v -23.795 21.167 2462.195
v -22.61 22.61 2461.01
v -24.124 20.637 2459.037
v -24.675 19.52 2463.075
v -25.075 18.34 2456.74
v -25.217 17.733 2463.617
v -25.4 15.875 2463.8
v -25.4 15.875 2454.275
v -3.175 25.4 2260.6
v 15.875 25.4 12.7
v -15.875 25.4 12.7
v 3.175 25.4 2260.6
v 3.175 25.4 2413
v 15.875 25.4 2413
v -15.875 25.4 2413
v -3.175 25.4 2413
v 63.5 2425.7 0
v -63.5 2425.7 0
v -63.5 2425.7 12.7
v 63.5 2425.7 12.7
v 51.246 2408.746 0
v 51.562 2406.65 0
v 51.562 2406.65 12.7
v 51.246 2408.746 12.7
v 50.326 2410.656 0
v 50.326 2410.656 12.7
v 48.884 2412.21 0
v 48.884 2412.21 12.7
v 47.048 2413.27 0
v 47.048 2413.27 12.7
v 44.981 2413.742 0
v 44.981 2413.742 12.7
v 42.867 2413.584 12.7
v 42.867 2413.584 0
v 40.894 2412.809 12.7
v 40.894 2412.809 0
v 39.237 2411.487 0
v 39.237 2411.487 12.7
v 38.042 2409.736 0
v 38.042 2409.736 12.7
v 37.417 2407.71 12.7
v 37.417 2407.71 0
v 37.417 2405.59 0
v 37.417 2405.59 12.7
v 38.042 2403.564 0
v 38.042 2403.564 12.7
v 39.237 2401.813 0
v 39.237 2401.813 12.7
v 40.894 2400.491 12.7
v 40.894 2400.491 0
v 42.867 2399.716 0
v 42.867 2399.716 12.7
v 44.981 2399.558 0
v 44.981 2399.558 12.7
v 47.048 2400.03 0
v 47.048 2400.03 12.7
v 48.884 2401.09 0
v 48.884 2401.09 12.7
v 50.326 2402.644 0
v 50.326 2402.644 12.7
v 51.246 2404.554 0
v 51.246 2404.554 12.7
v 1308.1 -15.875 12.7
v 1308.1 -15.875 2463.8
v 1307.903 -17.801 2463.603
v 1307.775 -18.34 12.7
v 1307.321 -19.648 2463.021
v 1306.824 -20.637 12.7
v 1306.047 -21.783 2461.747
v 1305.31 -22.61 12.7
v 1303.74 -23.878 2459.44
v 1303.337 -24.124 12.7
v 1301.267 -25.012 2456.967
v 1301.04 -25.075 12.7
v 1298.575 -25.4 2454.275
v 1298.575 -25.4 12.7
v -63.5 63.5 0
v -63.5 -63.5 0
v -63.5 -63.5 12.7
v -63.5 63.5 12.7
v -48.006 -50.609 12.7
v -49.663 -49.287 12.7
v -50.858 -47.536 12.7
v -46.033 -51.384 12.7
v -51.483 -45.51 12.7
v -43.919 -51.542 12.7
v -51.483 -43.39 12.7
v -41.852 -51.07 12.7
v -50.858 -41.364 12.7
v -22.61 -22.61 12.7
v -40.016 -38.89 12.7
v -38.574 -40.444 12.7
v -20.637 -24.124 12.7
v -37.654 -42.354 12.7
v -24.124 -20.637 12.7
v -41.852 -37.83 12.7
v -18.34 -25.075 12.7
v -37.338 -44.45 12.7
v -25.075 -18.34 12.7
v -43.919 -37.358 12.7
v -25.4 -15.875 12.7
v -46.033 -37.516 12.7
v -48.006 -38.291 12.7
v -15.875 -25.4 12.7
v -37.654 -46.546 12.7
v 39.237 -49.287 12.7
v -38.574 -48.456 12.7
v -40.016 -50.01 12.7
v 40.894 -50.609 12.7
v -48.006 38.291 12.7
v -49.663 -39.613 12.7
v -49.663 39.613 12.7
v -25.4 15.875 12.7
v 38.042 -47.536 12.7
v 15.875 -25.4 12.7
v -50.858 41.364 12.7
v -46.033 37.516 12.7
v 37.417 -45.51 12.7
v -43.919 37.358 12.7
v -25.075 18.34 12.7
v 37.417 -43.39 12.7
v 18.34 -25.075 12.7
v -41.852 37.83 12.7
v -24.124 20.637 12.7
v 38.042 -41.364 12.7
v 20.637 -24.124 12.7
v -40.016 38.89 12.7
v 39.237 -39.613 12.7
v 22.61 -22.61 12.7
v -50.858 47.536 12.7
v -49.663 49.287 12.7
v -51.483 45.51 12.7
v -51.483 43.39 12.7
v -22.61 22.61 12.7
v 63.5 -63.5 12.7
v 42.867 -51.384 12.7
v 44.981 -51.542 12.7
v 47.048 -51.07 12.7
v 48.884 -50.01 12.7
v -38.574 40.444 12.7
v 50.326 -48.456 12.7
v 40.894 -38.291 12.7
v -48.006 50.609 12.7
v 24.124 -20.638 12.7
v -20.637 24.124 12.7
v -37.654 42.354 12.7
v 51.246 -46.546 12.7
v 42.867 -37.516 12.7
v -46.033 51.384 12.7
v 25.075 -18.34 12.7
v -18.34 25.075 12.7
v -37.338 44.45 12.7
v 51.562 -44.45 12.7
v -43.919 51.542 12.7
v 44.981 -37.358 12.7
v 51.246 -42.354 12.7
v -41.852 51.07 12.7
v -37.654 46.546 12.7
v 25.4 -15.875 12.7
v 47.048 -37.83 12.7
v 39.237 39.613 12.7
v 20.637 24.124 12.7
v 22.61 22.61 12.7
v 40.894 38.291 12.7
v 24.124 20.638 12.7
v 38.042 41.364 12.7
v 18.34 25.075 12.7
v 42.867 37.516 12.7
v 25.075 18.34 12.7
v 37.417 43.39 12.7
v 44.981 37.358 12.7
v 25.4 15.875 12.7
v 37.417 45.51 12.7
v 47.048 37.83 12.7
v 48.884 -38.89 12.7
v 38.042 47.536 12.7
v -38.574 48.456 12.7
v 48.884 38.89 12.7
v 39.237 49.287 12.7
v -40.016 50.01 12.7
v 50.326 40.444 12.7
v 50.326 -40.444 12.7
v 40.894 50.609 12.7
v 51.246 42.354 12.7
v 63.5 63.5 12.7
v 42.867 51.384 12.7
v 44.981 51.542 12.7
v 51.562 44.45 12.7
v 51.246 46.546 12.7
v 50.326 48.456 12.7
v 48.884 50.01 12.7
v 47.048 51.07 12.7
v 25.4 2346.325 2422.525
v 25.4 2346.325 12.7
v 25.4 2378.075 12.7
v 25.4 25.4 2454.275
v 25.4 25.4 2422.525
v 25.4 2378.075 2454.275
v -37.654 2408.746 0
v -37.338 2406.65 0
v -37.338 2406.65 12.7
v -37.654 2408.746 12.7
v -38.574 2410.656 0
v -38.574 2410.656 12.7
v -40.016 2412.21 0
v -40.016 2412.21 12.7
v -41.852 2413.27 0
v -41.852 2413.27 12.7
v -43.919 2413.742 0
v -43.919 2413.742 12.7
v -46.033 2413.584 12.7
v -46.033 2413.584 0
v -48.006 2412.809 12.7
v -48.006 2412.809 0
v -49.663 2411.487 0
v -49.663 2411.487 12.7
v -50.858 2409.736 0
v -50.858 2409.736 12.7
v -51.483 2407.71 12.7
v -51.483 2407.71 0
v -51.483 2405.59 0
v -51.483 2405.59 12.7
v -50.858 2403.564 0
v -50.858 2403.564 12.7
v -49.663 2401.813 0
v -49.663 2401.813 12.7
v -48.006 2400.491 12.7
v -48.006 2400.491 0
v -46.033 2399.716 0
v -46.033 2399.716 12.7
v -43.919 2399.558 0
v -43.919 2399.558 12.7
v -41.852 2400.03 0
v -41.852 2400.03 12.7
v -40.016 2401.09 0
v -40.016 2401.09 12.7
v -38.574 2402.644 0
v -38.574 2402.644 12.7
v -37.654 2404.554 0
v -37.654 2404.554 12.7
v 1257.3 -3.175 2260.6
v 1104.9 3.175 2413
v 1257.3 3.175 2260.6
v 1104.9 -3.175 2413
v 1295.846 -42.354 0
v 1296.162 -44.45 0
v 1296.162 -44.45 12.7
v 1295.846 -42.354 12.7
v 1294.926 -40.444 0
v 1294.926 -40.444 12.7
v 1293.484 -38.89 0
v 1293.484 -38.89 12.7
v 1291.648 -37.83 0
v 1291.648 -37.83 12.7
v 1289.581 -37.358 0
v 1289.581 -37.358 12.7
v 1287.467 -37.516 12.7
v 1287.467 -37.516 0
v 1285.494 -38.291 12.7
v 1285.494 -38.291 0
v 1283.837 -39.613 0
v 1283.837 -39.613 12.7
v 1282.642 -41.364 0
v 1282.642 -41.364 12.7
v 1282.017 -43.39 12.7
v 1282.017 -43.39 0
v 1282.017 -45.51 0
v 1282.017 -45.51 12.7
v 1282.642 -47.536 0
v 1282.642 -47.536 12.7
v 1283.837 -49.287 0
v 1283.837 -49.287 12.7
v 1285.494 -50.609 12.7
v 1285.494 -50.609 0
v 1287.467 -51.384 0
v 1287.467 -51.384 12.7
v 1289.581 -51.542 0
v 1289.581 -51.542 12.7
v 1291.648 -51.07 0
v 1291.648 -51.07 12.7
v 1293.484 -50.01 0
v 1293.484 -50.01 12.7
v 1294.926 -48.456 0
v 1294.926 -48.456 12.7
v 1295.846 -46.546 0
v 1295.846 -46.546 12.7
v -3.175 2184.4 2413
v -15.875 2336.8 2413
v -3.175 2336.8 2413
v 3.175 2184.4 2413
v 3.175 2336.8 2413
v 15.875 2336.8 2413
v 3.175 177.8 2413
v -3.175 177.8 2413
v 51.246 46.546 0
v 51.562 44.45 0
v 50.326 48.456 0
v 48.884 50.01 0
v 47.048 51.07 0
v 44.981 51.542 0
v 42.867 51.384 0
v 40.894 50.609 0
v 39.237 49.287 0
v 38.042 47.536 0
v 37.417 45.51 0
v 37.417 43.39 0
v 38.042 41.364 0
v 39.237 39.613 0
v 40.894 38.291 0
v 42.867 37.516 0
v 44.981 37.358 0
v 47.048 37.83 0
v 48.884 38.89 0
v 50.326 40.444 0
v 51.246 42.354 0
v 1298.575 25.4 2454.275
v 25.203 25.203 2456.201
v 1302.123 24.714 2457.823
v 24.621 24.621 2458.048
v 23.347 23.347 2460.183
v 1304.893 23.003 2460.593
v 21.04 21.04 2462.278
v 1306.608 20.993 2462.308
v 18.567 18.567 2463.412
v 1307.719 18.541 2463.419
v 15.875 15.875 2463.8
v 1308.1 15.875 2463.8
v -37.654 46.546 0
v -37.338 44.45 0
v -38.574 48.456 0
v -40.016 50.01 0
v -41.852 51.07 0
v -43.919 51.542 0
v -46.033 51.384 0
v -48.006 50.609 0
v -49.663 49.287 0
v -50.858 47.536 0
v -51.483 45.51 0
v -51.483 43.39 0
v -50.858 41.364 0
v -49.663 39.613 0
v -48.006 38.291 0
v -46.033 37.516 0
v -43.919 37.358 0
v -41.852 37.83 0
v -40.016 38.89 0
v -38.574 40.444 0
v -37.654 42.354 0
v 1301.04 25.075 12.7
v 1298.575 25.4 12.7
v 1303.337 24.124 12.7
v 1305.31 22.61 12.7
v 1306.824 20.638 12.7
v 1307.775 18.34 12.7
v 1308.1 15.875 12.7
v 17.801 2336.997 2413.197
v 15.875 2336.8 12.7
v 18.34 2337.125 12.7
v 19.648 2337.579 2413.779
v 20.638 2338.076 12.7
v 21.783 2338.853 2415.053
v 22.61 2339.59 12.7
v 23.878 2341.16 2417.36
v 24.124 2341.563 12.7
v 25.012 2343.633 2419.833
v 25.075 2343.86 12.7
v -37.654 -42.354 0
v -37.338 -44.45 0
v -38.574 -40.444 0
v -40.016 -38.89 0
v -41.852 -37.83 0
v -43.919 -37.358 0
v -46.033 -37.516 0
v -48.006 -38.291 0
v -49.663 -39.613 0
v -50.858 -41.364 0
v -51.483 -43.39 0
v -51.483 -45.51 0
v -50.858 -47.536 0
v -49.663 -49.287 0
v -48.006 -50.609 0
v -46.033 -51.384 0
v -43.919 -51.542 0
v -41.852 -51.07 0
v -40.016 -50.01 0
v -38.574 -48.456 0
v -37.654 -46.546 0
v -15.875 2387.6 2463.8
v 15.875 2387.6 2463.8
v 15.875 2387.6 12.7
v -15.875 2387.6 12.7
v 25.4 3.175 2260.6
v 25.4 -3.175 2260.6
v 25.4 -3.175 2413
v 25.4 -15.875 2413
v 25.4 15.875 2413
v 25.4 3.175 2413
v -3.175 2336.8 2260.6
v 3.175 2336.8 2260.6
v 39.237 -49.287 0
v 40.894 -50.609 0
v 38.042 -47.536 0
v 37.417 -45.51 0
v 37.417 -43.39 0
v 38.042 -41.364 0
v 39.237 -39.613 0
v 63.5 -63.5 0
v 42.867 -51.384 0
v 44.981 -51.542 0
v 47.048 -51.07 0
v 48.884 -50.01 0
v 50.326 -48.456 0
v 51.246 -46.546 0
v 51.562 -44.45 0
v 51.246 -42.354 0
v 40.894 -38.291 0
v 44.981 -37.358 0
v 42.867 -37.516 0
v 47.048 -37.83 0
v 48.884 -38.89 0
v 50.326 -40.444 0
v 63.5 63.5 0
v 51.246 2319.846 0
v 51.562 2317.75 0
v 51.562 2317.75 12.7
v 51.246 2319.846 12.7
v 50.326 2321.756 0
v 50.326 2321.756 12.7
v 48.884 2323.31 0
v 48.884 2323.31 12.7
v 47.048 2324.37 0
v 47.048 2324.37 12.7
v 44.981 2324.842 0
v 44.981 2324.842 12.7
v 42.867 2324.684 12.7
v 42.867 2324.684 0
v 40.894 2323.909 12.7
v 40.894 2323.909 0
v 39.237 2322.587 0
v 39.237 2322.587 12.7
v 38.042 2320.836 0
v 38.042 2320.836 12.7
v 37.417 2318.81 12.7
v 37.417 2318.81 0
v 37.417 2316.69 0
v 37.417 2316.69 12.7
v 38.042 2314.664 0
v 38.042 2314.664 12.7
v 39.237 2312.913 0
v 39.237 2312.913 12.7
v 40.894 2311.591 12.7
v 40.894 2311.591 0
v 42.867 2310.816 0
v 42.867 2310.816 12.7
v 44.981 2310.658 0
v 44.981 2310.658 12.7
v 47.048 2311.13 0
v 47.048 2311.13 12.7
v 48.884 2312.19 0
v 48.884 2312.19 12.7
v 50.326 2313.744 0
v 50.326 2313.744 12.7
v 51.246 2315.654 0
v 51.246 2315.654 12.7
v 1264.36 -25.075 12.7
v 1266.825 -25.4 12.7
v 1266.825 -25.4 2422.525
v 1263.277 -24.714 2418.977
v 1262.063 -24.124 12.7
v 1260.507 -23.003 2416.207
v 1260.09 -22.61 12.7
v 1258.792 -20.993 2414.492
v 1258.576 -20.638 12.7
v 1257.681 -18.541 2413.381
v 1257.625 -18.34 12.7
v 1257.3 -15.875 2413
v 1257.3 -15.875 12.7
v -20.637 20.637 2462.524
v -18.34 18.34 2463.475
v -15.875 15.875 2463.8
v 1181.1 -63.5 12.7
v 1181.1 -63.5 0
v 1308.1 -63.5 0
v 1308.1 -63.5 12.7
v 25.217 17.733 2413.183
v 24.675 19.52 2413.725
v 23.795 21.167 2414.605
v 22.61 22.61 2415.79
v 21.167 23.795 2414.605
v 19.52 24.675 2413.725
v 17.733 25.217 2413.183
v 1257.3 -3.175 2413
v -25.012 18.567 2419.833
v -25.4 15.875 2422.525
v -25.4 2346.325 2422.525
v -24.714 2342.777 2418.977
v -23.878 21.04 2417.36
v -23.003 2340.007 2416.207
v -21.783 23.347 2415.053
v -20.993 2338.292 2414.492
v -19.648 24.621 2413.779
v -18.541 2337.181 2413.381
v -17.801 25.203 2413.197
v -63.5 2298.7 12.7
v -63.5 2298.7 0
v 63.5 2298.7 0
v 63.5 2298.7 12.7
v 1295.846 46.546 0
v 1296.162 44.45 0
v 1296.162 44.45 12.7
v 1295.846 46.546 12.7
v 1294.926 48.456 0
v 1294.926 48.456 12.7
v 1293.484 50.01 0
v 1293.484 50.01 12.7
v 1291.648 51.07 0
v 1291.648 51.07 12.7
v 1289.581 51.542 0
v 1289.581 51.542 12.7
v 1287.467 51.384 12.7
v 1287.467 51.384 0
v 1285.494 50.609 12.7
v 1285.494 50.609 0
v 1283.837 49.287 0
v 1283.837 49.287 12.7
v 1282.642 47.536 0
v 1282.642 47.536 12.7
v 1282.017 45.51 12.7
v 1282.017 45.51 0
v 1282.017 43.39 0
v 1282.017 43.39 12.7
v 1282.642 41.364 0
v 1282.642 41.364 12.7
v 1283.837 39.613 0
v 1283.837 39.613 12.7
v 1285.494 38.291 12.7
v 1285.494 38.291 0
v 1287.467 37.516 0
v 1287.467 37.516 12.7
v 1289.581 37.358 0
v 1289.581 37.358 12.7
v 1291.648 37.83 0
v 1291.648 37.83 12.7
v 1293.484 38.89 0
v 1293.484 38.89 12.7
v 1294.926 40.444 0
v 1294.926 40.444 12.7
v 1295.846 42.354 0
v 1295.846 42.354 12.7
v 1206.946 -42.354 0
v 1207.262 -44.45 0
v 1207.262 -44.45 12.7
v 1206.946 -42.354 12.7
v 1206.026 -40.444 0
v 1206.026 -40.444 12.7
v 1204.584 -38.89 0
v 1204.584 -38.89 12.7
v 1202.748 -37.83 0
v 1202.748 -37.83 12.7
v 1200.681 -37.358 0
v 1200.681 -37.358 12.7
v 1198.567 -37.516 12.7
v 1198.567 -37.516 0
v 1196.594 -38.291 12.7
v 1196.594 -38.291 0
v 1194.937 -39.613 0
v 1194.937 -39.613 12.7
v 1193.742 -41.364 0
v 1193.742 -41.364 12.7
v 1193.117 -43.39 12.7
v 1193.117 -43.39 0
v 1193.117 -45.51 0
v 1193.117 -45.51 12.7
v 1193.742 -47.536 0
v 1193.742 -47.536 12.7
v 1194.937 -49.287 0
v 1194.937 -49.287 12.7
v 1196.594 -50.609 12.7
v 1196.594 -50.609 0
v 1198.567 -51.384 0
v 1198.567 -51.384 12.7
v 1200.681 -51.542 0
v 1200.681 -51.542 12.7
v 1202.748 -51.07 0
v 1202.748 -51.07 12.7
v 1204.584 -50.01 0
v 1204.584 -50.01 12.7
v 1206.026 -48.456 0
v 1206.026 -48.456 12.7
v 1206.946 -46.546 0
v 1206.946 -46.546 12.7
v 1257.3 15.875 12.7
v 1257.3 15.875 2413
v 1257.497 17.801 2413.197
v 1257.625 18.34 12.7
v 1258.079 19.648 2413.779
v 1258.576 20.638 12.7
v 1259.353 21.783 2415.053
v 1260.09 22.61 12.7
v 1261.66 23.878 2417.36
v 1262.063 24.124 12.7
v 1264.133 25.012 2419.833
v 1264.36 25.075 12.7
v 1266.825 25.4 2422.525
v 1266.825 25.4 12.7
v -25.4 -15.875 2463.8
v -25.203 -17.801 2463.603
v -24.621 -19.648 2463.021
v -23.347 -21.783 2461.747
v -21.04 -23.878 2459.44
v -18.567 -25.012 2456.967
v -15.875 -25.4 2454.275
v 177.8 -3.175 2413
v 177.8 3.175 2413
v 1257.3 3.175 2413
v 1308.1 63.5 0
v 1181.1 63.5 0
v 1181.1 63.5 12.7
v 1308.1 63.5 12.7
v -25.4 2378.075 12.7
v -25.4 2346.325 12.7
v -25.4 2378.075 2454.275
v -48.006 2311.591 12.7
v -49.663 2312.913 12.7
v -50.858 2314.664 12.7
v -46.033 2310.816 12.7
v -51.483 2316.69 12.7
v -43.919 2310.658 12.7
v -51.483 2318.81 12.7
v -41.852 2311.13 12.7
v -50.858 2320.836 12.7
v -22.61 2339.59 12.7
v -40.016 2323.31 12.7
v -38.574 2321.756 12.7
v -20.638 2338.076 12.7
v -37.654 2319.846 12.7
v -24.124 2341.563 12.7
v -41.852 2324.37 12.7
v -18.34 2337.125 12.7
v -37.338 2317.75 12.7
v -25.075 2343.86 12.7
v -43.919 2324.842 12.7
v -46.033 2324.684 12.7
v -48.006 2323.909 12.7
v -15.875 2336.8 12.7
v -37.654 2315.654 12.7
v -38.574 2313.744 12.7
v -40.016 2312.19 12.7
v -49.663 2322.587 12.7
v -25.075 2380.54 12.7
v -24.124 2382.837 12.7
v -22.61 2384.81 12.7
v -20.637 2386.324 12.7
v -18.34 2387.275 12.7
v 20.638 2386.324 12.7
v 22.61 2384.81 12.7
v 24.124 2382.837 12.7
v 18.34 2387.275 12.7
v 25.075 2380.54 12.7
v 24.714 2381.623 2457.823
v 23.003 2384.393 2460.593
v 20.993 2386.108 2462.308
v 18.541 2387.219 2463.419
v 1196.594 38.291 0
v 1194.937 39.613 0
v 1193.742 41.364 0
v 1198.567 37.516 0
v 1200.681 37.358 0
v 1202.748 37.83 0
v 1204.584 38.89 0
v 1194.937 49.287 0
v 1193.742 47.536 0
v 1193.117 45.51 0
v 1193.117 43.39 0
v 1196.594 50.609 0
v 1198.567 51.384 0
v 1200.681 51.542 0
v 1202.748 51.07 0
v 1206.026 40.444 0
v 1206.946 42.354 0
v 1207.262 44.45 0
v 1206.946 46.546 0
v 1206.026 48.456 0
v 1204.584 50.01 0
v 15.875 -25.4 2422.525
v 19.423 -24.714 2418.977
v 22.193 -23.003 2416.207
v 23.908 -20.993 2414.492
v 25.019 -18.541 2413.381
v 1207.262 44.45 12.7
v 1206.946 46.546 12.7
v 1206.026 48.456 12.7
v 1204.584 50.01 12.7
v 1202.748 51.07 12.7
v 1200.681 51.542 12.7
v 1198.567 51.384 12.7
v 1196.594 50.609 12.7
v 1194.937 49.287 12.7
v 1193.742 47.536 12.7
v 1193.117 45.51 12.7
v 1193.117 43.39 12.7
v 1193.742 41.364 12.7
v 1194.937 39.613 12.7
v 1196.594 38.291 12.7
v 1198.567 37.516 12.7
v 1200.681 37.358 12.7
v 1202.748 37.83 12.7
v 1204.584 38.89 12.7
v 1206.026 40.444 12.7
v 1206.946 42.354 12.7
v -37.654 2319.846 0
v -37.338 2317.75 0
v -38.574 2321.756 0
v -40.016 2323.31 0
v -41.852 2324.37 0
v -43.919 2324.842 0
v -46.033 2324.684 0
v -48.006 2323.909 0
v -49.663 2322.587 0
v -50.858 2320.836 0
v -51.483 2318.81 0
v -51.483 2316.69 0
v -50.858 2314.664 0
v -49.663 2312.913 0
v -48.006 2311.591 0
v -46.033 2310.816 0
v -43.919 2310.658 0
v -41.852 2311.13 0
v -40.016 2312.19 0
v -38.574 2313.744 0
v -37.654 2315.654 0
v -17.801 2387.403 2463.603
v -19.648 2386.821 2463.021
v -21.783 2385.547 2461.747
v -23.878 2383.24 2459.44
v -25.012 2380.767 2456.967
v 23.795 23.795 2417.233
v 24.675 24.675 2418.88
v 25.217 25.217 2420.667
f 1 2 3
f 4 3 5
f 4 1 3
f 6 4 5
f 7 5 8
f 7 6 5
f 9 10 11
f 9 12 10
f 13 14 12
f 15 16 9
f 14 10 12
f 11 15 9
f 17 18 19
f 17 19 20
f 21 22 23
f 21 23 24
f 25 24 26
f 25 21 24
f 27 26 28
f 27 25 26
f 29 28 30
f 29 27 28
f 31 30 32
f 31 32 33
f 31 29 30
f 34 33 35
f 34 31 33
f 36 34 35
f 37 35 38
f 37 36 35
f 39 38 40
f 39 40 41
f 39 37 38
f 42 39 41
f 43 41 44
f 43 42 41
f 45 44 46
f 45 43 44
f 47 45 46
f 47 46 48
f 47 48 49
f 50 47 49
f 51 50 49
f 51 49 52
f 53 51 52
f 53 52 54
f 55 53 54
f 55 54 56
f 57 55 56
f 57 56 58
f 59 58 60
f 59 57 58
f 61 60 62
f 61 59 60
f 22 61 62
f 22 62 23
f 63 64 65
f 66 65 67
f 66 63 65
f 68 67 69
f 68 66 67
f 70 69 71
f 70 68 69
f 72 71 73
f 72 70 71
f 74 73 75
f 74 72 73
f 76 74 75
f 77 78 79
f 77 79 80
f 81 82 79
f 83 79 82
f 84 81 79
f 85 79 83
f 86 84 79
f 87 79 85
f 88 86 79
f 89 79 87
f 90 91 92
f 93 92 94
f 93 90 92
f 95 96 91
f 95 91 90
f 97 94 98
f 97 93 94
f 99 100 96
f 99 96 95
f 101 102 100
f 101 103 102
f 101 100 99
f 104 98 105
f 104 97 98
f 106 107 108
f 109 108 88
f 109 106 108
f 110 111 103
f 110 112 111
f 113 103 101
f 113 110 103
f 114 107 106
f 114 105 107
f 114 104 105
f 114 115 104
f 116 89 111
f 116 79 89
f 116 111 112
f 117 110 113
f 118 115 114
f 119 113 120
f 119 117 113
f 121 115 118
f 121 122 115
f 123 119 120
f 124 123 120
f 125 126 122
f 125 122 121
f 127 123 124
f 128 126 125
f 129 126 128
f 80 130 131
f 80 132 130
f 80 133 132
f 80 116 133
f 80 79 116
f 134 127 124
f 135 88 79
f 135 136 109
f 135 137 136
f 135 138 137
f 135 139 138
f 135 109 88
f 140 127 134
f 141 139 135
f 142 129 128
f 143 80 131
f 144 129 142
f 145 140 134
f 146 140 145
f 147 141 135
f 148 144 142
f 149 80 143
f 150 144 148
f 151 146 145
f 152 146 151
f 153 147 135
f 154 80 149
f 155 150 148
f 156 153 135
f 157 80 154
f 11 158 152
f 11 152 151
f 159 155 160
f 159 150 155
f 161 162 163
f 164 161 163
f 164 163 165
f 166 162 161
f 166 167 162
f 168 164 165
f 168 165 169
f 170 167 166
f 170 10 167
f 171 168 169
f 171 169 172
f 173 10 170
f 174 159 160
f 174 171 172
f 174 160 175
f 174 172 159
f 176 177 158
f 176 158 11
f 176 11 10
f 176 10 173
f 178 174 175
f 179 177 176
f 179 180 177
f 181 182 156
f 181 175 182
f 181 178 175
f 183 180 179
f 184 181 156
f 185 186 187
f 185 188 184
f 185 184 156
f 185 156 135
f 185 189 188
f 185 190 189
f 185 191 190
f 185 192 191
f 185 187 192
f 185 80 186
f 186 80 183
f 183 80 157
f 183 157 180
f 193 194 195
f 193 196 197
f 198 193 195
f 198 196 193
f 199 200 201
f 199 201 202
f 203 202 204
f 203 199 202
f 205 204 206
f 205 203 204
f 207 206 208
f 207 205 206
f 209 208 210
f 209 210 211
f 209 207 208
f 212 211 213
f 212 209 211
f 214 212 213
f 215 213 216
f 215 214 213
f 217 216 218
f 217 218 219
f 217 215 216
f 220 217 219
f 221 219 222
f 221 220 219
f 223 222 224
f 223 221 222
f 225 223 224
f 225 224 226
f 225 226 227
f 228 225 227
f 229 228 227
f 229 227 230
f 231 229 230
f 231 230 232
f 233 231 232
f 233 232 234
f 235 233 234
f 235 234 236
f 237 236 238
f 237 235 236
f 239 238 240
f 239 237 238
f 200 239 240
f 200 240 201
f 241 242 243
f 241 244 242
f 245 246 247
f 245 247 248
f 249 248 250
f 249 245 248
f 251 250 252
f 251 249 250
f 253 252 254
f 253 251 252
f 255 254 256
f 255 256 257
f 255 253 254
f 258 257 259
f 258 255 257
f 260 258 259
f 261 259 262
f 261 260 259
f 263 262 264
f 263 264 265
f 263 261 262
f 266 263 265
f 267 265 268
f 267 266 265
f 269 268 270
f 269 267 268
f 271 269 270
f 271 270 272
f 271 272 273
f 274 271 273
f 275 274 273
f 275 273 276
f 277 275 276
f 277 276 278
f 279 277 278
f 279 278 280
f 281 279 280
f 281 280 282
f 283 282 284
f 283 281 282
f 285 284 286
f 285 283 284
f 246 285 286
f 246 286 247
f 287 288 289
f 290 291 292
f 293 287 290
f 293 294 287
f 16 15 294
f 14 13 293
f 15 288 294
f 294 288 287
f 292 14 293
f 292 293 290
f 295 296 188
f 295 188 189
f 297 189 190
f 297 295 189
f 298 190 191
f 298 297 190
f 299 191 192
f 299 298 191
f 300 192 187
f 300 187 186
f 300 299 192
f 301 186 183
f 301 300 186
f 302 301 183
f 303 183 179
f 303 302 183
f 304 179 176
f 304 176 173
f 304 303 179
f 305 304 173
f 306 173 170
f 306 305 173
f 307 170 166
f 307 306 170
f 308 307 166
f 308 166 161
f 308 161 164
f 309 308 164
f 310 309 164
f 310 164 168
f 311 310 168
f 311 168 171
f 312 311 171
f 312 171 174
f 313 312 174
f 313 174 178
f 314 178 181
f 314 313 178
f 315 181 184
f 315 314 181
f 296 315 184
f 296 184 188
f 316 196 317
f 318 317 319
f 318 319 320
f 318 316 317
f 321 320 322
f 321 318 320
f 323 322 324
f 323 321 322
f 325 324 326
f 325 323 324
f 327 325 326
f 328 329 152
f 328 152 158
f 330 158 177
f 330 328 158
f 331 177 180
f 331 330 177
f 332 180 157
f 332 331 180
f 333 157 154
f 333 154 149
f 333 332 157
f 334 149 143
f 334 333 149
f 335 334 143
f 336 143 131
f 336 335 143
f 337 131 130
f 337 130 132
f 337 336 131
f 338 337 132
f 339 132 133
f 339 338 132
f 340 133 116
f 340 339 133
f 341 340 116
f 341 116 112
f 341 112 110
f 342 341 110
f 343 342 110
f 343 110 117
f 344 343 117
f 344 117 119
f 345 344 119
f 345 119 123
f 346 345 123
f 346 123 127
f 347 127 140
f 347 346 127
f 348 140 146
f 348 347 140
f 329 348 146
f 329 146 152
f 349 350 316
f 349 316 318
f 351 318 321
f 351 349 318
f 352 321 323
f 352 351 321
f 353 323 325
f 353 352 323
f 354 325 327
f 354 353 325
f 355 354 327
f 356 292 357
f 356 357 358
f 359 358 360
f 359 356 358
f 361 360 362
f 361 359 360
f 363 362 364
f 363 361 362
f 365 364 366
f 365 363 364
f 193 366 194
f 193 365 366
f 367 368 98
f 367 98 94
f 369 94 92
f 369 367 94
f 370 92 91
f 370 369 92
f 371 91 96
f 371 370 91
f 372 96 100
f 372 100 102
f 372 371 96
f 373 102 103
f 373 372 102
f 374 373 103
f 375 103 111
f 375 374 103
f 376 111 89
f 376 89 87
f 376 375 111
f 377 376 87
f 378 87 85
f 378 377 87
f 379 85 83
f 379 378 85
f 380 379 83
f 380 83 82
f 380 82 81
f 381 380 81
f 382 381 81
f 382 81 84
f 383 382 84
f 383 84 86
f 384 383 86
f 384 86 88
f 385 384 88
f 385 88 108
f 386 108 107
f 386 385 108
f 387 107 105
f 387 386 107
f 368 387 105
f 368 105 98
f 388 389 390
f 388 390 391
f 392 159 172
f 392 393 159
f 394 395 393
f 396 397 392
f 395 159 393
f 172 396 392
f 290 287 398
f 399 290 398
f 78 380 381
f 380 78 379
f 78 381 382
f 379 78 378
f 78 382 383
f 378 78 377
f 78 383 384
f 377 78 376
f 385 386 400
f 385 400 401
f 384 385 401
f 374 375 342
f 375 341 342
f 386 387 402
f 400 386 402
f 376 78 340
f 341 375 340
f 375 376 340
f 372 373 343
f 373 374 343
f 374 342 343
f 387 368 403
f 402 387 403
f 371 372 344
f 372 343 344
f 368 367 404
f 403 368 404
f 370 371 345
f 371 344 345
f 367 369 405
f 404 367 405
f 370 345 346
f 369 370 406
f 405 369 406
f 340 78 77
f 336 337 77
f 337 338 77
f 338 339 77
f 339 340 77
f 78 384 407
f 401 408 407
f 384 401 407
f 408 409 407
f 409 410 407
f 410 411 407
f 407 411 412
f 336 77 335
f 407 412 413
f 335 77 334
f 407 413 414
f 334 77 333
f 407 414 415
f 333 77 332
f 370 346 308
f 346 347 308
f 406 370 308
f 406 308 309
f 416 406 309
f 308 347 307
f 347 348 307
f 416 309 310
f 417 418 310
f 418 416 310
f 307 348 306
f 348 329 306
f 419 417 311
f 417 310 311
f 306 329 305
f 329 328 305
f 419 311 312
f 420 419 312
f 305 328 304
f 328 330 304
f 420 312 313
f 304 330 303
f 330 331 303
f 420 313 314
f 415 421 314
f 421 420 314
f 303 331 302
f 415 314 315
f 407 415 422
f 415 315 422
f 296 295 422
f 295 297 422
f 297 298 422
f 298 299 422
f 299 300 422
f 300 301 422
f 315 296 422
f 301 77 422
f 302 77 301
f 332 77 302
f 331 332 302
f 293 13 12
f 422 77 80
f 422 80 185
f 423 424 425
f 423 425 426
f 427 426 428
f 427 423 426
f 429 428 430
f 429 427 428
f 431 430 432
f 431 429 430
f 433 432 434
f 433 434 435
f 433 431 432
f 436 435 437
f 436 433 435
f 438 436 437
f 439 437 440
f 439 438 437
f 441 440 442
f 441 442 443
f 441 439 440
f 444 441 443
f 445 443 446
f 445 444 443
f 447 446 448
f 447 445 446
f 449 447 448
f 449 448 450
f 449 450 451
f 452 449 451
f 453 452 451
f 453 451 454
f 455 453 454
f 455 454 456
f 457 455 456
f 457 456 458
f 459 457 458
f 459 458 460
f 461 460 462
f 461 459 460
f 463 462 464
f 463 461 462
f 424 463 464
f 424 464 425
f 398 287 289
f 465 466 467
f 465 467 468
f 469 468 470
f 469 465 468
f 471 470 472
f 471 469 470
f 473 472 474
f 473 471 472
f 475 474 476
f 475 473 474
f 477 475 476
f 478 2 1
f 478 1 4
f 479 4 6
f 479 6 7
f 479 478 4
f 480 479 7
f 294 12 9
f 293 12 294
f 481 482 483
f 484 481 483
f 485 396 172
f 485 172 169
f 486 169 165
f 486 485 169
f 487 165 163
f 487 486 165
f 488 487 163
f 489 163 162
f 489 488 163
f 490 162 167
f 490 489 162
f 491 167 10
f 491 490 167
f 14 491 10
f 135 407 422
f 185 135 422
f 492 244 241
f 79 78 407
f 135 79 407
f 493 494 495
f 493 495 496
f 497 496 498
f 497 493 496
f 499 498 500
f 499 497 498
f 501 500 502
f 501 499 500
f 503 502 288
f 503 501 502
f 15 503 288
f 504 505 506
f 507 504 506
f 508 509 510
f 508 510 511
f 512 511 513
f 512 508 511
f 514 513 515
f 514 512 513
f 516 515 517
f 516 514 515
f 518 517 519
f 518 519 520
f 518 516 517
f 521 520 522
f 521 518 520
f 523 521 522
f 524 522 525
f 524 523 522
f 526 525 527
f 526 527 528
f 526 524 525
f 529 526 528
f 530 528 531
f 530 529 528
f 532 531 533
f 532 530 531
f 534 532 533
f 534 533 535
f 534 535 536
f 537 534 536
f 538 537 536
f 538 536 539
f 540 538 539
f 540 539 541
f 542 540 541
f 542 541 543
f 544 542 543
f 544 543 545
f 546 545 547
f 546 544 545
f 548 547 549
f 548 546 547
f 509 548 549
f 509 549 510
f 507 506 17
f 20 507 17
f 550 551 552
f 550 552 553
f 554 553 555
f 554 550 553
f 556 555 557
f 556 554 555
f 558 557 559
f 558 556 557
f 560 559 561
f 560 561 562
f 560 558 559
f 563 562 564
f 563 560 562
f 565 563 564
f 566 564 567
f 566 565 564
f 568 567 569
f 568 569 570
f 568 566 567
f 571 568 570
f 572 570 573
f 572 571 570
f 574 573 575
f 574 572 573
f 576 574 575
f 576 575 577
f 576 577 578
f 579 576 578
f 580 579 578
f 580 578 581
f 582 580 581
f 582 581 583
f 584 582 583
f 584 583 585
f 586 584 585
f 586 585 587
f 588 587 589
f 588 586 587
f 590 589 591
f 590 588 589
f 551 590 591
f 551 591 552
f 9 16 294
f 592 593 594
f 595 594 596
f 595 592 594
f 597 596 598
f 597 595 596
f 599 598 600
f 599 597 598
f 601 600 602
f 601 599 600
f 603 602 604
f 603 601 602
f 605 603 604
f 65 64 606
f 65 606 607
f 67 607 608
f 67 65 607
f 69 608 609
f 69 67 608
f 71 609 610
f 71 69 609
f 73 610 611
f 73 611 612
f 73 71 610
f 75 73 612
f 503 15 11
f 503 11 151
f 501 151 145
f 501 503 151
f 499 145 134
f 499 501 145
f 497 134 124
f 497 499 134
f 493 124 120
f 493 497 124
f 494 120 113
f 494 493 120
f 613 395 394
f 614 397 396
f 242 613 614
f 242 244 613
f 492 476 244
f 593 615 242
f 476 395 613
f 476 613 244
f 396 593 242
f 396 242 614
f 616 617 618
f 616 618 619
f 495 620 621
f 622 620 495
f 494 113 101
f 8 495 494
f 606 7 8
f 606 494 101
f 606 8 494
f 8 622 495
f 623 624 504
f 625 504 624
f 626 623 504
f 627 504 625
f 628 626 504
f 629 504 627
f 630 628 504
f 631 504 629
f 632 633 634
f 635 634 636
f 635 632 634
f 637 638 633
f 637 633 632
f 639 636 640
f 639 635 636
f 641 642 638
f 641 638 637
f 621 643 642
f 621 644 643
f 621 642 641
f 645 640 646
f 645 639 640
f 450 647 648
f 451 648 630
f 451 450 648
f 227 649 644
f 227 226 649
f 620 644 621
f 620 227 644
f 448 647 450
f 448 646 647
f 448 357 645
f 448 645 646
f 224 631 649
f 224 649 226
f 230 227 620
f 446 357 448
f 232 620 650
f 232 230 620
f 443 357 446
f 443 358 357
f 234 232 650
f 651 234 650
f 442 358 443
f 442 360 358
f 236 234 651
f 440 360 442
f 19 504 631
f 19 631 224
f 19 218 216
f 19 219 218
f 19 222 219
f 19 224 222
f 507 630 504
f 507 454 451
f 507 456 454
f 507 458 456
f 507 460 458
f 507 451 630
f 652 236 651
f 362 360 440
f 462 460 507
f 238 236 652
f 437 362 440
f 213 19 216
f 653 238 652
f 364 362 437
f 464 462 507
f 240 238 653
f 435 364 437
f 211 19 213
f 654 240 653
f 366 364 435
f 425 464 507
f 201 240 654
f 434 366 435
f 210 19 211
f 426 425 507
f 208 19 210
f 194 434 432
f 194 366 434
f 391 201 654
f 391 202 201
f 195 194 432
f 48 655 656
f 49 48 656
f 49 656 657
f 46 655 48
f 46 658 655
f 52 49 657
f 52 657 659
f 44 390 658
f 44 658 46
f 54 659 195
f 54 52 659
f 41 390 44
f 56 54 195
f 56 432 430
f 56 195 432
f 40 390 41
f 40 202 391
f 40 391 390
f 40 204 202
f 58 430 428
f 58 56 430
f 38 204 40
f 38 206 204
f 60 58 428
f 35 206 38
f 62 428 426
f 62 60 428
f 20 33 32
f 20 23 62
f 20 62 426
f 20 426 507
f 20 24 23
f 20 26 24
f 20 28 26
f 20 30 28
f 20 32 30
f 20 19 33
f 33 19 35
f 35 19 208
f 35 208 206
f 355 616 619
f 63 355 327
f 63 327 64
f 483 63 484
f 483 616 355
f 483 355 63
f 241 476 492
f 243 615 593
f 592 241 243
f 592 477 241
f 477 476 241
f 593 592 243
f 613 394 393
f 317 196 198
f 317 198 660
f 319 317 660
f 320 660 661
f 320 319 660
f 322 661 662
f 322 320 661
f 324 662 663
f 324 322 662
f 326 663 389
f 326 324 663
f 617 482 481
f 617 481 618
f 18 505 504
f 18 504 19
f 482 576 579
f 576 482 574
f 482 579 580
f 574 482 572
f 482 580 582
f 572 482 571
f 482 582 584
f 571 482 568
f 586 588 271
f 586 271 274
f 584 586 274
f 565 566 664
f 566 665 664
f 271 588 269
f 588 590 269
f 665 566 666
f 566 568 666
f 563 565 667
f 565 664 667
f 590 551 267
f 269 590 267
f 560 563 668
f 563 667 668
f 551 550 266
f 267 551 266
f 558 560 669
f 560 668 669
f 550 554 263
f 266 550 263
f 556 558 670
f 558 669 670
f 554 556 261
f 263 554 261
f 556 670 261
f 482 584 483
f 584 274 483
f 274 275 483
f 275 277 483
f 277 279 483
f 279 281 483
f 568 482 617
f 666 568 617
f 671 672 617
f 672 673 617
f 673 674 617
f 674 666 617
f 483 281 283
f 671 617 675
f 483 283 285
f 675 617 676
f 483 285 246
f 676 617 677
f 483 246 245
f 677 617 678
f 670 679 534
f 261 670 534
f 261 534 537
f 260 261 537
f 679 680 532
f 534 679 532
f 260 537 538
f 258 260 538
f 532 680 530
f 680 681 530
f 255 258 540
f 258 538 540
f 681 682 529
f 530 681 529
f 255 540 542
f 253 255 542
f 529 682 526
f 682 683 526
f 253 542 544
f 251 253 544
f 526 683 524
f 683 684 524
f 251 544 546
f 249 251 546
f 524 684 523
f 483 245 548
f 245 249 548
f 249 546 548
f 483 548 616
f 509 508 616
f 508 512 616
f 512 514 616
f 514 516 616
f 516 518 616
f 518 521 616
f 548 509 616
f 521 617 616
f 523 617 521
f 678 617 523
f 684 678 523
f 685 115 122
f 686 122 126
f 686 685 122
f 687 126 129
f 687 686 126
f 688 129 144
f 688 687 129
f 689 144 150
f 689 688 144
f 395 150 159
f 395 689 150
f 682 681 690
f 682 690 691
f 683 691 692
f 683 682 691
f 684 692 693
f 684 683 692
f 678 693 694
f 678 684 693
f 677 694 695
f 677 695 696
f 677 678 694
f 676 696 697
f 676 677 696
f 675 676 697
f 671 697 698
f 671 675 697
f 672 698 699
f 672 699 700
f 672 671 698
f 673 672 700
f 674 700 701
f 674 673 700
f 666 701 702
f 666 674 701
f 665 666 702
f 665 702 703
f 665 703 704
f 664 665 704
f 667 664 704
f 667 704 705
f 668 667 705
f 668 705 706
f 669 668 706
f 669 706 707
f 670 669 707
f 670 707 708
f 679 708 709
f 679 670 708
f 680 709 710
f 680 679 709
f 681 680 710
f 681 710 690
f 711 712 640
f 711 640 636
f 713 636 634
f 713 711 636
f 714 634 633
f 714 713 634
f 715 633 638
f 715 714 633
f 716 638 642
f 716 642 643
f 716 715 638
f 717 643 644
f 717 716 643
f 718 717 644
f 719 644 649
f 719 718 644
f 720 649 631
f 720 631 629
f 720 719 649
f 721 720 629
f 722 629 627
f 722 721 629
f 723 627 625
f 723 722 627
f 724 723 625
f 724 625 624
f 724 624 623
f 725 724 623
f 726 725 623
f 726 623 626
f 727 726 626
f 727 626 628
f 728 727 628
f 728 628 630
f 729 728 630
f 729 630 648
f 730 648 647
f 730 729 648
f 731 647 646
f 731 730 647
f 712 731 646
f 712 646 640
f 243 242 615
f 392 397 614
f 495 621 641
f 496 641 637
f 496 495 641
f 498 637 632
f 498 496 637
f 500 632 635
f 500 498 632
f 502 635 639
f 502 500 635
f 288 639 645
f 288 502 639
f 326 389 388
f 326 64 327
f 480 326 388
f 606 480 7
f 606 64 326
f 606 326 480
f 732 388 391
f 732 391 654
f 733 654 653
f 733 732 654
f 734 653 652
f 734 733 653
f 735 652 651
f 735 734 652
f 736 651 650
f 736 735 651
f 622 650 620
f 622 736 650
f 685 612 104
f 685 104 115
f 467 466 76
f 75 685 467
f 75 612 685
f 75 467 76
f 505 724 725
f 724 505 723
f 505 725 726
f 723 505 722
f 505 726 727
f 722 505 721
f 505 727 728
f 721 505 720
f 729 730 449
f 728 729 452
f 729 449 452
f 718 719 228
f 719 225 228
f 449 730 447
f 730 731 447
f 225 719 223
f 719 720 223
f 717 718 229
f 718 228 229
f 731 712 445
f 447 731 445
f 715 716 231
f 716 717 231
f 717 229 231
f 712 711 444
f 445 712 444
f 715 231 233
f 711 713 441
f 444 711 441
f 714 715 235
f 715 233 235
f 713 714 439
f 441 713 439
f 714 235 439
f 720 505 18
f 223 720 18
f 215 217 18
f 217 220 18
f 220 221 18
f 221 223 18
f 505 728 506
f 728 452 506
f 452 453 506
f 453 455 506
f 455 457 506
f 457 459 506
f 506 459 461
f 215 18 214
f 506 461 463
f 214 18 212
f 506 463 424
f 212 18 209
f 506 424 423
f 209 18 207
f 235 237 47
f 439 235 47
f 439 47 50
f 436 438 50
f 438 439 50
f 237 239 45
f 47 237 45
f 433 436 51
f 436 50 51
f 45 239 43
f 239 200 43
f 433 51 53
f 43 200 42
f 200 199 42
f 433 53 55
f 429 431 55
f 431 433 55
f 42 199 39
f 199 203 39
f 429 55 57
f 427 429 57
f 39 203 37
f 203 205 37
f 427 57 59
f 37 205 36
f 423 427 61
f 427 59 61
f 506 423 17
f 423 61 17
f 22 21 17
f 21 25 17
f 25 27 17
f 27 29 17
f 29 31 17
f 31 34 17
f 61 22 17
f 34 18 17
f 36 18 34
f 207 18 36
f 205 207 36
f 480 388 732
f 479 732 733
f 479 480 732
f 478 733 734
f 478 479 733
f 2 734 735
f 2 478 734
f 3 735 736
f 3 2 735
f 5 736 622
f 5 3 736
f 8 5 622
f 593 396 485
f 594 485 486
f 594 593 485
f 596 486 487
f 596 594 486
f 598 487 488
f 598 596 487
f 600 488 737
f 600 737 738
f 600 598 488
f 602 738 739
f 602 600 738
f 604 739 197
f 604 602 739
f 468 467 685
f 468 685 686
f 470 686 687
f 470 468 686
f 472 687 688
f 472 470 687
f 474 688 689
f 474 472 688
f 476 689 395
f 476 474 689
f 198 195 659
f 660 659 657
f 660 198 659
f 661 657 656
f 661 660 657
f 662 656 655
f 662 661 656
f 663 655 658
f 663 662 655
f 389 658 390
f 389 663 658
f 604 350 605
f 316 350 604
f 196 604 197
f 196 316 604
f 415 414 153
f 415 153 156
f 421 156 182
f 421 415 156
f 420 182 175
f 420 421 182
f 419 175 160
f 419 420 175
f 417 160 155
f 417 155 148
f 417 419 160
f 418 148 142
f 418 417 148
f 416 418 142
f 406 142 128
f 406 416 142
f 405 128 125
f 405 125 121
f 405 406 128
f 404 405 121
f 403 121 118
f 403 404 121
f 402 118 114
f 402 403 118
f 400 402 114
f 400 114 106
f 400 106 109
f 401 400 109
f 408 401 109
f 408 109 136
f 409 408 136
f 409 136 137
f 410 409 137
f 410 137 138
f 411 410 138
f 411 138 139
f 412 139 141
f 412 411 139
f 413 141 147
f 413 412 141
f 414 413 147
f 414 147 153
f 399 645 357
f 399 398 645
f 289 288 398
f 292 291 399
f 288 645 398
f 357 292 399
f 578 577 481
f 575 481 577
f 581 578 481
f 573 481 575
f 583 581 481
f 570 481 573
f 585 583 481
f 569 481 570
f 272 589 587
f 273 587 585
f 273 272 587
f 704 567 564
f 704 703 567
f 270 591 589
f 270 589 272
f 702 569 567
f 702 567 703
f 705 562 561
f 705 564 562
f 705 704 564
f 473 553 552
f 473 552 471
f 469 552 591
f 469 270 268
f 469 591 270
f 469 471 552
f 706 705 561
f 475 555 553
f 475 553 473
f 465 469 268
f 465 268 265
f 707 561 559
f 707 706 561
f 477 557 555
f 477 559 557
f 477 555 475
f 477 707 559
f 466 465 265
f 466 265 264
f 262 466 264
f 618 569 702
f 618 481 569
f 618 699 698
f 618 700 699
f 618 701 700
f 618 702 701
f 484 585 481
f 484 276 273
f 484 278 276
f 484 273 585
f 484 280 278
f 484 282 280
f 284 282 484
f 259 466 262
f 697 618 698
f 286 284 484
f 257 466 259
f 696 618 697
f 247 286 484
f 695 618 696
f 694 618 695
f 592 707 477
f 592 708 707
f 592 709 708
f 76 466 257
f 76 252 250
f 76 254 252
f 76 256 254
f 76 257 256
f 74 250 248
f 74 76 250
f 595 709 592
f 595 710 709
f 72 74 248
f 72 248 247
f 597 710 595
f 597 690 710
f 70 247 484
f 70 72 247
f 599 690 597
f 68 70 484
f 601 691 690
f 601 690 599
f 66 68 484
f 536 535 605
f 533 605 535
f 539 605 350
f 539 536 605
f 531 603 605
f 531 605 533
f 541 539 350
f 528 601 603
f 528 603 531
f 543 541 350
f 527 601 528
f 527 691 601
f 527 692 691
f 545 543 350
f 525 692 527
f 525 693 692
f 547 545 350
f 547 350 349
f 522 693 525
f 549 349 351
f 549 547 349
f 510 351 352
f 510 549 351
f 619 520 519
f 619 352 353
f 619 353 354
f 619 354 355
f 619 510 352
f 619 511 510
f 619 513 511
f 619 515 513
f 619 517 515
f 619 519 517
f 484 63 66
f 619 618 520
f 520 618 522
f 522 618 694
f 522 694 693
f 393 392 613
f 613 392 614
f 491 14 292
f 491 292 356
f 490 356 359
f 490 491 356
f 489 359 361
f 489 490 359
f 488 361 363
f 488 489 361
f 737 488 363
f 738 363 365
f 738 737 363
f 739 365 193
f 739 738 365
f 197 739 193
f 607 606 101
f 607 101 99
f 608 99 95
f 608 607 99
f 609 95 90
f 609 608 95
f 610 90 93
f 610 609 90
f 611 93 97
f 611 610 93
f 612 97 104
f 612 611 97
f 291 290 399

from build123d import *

# Parameters (mm, degrees)
F5_W      = 127
F5_H      = 127
F5_R      = 7.112
F6_DEPTH  = 12.7
F8_DEPTH  = 3.175
F10_DEPTH = 3.175


with BuildPart() as f3:
    # F3: sweep along a path in F2
    with BuildLine(Plane.XZ) as f3_path:
        Line((0, 0), (0, 2438.4))
        Line((0, 2438.4), (1282.7, 2438.4))
        Line((1282.7, 2438.4), (1282.7, 0))
    # F1 (on Top) → F3 (sweep)
    with BuildSketch(Plane.XY):
        with BuildLine():
            Line((0, 25.4), (-15.875, 25.4))
            ThreePointArc((-15.875, 25.4), (-22.6101920908, 22.6101920908), (-25.4, 15.875))
            Line((-25.4, 15.875), (-25.4, -15.875))
            ThreePointArc((-25.4, -15.875), (-22.6101920908, -22.6101920908), (-15.875, -25.4))
            Line((-15.875, -25.4), (15.875, -25.4))
            ThreePointArc((15.875, -25.4), (22.6101920908, -22.6101920908), (25.4, -15.875))
            Line((25.4, -15.875), (25.4, 15.875))
            ThreePointArc((25.4, 15.875), (22.6101920908, 22.6101920908), (15.875, 25.4))
            Line((15.875, 25.4), (0, 25.4))
        make_face()
    sweep(path=f3_path.line, transition=Transition.RIGHT)

    # F4: sweep along a path in F0
    with BuildLine(Plane.YZ) as f4_path:
        Line((2362.2, 0), (2362.2, 2438.4))
        Line((2362.2, 2438.4), (0, 2438.4))
    # F1 (on Top) → F4 (sweep)
    with BuildSketch(Plane.XY):
        with BuildLine():
            Line((-15.875, 2336.8), (0, 2336.8))
            Line((0, 2336.8), (15.875, 2336.8))
            ThreePointArc((15.875, 2336.8), (22.6101920908, 2339.5898079092), (25.4, 2346.325))
            Line((25.4, 2346.325), (25.4, 2378.075))
            ThreePointArc((25.4, 2378.075), (22.6101920908, 2384.8101920908), (15.875, 2387.6))
            Line((15.875, 2387.6), (-15.875, 2387.6))
            ThreePointArc((-15.875, 2387.6), (-22.6101920908, 2384.8101920908), (-25.4, 2378.075))
            Line((-25.4, 2378.075), (-25.4, 2346.325))
            ThreePointArc((-25.4, 2346.325), (-22.6101920908, 2339.5898079092), (-15.875, 2336.8))
        make_face()
    sweep(path=f4_path.line, transition=Transition.RIGHT)

    # F5 (on Top) → F6 (join)
    with BuildSketch(Plane.XY):
        Rectangle(F5_W, F5_H)
        with Locations((-44.45, -44.45)):
            Circle(F5_R, mode=Mode.SUBTRACT)
        with Locations((-44.45, 44.45)):
            Circle(F5_R, mode=Mode.SUBTRACT)
        with Locations((44.45, -44.45)):
            Circle(F5_R, mode=Mode.SUBTRACT)
        with Locations((44.45, 44.45)):
            Circle(F5_R, mode=Mode.SUBTRACT)
        with Locations((0, 2362.2)):
            Rectangle(F5_W, F5_H)
        with Locations((-44.45, 2317.75)):
            Circle(F5_R, mode=Mode.SUBTRACT)
        with Locations((-44.45, 2406.65)):
            Circle(F5_R, mode=Mode.SUBTRACT)
        with Locations((44.45, 2317.75)):
            Circle(F5_R, mode=Mode.SUBTRACT)
        with Locations((44.45, 2406.65)):
            Circle(F5_R, mode=Mode.SUBTRACT)
        with Locations((1244.6, 0)):
            Rectangle(F5_W, F5_H)
        with Locations((1200.15, -44.45)):
            Circle(F5_R, mode=Mode.SUBTRACT)
        with Locations((1200.15, 44.45)):
            Circle(F5_R, mode=Mode.SUBTRACT)
        with Locations((1289.05, -44.45)):
            Circle(F5_R, mode=Mode.SUBTRACT)
        with Locations((1289.05, 44.45)):
            Circle(F5_R, mode=Mode.SUBTRACT)
    extrude(amount=F6_DEPTH)

    # F7 (on Right) → F8 (join, symmetric)
    with BuildSketch(Plane.YZ):
        Polygon((2336.8, 2260.6), (2336.8, 2413), (2184.4, 2413), align=None)
        Polygon((177.8, 2413), (25.4, 2413), (25.4, 2260.6), align=None)
    extrude(amount=F8_DEPTH, both=True)

    # F9 (on Front) → F10 (join, symmetric)
    with BuildSketch(Plane.XZ):
        Polygon((177.8, 2413), (25.4, 2413), (25.4, 2260.6), align=None)
        Polygon((1257.3, 2260.6), (1257.3, 2413), (1104.9, 2413), align=None)
    extrude(amount=F10_DEPTH, both=True)


solid = f3.part
